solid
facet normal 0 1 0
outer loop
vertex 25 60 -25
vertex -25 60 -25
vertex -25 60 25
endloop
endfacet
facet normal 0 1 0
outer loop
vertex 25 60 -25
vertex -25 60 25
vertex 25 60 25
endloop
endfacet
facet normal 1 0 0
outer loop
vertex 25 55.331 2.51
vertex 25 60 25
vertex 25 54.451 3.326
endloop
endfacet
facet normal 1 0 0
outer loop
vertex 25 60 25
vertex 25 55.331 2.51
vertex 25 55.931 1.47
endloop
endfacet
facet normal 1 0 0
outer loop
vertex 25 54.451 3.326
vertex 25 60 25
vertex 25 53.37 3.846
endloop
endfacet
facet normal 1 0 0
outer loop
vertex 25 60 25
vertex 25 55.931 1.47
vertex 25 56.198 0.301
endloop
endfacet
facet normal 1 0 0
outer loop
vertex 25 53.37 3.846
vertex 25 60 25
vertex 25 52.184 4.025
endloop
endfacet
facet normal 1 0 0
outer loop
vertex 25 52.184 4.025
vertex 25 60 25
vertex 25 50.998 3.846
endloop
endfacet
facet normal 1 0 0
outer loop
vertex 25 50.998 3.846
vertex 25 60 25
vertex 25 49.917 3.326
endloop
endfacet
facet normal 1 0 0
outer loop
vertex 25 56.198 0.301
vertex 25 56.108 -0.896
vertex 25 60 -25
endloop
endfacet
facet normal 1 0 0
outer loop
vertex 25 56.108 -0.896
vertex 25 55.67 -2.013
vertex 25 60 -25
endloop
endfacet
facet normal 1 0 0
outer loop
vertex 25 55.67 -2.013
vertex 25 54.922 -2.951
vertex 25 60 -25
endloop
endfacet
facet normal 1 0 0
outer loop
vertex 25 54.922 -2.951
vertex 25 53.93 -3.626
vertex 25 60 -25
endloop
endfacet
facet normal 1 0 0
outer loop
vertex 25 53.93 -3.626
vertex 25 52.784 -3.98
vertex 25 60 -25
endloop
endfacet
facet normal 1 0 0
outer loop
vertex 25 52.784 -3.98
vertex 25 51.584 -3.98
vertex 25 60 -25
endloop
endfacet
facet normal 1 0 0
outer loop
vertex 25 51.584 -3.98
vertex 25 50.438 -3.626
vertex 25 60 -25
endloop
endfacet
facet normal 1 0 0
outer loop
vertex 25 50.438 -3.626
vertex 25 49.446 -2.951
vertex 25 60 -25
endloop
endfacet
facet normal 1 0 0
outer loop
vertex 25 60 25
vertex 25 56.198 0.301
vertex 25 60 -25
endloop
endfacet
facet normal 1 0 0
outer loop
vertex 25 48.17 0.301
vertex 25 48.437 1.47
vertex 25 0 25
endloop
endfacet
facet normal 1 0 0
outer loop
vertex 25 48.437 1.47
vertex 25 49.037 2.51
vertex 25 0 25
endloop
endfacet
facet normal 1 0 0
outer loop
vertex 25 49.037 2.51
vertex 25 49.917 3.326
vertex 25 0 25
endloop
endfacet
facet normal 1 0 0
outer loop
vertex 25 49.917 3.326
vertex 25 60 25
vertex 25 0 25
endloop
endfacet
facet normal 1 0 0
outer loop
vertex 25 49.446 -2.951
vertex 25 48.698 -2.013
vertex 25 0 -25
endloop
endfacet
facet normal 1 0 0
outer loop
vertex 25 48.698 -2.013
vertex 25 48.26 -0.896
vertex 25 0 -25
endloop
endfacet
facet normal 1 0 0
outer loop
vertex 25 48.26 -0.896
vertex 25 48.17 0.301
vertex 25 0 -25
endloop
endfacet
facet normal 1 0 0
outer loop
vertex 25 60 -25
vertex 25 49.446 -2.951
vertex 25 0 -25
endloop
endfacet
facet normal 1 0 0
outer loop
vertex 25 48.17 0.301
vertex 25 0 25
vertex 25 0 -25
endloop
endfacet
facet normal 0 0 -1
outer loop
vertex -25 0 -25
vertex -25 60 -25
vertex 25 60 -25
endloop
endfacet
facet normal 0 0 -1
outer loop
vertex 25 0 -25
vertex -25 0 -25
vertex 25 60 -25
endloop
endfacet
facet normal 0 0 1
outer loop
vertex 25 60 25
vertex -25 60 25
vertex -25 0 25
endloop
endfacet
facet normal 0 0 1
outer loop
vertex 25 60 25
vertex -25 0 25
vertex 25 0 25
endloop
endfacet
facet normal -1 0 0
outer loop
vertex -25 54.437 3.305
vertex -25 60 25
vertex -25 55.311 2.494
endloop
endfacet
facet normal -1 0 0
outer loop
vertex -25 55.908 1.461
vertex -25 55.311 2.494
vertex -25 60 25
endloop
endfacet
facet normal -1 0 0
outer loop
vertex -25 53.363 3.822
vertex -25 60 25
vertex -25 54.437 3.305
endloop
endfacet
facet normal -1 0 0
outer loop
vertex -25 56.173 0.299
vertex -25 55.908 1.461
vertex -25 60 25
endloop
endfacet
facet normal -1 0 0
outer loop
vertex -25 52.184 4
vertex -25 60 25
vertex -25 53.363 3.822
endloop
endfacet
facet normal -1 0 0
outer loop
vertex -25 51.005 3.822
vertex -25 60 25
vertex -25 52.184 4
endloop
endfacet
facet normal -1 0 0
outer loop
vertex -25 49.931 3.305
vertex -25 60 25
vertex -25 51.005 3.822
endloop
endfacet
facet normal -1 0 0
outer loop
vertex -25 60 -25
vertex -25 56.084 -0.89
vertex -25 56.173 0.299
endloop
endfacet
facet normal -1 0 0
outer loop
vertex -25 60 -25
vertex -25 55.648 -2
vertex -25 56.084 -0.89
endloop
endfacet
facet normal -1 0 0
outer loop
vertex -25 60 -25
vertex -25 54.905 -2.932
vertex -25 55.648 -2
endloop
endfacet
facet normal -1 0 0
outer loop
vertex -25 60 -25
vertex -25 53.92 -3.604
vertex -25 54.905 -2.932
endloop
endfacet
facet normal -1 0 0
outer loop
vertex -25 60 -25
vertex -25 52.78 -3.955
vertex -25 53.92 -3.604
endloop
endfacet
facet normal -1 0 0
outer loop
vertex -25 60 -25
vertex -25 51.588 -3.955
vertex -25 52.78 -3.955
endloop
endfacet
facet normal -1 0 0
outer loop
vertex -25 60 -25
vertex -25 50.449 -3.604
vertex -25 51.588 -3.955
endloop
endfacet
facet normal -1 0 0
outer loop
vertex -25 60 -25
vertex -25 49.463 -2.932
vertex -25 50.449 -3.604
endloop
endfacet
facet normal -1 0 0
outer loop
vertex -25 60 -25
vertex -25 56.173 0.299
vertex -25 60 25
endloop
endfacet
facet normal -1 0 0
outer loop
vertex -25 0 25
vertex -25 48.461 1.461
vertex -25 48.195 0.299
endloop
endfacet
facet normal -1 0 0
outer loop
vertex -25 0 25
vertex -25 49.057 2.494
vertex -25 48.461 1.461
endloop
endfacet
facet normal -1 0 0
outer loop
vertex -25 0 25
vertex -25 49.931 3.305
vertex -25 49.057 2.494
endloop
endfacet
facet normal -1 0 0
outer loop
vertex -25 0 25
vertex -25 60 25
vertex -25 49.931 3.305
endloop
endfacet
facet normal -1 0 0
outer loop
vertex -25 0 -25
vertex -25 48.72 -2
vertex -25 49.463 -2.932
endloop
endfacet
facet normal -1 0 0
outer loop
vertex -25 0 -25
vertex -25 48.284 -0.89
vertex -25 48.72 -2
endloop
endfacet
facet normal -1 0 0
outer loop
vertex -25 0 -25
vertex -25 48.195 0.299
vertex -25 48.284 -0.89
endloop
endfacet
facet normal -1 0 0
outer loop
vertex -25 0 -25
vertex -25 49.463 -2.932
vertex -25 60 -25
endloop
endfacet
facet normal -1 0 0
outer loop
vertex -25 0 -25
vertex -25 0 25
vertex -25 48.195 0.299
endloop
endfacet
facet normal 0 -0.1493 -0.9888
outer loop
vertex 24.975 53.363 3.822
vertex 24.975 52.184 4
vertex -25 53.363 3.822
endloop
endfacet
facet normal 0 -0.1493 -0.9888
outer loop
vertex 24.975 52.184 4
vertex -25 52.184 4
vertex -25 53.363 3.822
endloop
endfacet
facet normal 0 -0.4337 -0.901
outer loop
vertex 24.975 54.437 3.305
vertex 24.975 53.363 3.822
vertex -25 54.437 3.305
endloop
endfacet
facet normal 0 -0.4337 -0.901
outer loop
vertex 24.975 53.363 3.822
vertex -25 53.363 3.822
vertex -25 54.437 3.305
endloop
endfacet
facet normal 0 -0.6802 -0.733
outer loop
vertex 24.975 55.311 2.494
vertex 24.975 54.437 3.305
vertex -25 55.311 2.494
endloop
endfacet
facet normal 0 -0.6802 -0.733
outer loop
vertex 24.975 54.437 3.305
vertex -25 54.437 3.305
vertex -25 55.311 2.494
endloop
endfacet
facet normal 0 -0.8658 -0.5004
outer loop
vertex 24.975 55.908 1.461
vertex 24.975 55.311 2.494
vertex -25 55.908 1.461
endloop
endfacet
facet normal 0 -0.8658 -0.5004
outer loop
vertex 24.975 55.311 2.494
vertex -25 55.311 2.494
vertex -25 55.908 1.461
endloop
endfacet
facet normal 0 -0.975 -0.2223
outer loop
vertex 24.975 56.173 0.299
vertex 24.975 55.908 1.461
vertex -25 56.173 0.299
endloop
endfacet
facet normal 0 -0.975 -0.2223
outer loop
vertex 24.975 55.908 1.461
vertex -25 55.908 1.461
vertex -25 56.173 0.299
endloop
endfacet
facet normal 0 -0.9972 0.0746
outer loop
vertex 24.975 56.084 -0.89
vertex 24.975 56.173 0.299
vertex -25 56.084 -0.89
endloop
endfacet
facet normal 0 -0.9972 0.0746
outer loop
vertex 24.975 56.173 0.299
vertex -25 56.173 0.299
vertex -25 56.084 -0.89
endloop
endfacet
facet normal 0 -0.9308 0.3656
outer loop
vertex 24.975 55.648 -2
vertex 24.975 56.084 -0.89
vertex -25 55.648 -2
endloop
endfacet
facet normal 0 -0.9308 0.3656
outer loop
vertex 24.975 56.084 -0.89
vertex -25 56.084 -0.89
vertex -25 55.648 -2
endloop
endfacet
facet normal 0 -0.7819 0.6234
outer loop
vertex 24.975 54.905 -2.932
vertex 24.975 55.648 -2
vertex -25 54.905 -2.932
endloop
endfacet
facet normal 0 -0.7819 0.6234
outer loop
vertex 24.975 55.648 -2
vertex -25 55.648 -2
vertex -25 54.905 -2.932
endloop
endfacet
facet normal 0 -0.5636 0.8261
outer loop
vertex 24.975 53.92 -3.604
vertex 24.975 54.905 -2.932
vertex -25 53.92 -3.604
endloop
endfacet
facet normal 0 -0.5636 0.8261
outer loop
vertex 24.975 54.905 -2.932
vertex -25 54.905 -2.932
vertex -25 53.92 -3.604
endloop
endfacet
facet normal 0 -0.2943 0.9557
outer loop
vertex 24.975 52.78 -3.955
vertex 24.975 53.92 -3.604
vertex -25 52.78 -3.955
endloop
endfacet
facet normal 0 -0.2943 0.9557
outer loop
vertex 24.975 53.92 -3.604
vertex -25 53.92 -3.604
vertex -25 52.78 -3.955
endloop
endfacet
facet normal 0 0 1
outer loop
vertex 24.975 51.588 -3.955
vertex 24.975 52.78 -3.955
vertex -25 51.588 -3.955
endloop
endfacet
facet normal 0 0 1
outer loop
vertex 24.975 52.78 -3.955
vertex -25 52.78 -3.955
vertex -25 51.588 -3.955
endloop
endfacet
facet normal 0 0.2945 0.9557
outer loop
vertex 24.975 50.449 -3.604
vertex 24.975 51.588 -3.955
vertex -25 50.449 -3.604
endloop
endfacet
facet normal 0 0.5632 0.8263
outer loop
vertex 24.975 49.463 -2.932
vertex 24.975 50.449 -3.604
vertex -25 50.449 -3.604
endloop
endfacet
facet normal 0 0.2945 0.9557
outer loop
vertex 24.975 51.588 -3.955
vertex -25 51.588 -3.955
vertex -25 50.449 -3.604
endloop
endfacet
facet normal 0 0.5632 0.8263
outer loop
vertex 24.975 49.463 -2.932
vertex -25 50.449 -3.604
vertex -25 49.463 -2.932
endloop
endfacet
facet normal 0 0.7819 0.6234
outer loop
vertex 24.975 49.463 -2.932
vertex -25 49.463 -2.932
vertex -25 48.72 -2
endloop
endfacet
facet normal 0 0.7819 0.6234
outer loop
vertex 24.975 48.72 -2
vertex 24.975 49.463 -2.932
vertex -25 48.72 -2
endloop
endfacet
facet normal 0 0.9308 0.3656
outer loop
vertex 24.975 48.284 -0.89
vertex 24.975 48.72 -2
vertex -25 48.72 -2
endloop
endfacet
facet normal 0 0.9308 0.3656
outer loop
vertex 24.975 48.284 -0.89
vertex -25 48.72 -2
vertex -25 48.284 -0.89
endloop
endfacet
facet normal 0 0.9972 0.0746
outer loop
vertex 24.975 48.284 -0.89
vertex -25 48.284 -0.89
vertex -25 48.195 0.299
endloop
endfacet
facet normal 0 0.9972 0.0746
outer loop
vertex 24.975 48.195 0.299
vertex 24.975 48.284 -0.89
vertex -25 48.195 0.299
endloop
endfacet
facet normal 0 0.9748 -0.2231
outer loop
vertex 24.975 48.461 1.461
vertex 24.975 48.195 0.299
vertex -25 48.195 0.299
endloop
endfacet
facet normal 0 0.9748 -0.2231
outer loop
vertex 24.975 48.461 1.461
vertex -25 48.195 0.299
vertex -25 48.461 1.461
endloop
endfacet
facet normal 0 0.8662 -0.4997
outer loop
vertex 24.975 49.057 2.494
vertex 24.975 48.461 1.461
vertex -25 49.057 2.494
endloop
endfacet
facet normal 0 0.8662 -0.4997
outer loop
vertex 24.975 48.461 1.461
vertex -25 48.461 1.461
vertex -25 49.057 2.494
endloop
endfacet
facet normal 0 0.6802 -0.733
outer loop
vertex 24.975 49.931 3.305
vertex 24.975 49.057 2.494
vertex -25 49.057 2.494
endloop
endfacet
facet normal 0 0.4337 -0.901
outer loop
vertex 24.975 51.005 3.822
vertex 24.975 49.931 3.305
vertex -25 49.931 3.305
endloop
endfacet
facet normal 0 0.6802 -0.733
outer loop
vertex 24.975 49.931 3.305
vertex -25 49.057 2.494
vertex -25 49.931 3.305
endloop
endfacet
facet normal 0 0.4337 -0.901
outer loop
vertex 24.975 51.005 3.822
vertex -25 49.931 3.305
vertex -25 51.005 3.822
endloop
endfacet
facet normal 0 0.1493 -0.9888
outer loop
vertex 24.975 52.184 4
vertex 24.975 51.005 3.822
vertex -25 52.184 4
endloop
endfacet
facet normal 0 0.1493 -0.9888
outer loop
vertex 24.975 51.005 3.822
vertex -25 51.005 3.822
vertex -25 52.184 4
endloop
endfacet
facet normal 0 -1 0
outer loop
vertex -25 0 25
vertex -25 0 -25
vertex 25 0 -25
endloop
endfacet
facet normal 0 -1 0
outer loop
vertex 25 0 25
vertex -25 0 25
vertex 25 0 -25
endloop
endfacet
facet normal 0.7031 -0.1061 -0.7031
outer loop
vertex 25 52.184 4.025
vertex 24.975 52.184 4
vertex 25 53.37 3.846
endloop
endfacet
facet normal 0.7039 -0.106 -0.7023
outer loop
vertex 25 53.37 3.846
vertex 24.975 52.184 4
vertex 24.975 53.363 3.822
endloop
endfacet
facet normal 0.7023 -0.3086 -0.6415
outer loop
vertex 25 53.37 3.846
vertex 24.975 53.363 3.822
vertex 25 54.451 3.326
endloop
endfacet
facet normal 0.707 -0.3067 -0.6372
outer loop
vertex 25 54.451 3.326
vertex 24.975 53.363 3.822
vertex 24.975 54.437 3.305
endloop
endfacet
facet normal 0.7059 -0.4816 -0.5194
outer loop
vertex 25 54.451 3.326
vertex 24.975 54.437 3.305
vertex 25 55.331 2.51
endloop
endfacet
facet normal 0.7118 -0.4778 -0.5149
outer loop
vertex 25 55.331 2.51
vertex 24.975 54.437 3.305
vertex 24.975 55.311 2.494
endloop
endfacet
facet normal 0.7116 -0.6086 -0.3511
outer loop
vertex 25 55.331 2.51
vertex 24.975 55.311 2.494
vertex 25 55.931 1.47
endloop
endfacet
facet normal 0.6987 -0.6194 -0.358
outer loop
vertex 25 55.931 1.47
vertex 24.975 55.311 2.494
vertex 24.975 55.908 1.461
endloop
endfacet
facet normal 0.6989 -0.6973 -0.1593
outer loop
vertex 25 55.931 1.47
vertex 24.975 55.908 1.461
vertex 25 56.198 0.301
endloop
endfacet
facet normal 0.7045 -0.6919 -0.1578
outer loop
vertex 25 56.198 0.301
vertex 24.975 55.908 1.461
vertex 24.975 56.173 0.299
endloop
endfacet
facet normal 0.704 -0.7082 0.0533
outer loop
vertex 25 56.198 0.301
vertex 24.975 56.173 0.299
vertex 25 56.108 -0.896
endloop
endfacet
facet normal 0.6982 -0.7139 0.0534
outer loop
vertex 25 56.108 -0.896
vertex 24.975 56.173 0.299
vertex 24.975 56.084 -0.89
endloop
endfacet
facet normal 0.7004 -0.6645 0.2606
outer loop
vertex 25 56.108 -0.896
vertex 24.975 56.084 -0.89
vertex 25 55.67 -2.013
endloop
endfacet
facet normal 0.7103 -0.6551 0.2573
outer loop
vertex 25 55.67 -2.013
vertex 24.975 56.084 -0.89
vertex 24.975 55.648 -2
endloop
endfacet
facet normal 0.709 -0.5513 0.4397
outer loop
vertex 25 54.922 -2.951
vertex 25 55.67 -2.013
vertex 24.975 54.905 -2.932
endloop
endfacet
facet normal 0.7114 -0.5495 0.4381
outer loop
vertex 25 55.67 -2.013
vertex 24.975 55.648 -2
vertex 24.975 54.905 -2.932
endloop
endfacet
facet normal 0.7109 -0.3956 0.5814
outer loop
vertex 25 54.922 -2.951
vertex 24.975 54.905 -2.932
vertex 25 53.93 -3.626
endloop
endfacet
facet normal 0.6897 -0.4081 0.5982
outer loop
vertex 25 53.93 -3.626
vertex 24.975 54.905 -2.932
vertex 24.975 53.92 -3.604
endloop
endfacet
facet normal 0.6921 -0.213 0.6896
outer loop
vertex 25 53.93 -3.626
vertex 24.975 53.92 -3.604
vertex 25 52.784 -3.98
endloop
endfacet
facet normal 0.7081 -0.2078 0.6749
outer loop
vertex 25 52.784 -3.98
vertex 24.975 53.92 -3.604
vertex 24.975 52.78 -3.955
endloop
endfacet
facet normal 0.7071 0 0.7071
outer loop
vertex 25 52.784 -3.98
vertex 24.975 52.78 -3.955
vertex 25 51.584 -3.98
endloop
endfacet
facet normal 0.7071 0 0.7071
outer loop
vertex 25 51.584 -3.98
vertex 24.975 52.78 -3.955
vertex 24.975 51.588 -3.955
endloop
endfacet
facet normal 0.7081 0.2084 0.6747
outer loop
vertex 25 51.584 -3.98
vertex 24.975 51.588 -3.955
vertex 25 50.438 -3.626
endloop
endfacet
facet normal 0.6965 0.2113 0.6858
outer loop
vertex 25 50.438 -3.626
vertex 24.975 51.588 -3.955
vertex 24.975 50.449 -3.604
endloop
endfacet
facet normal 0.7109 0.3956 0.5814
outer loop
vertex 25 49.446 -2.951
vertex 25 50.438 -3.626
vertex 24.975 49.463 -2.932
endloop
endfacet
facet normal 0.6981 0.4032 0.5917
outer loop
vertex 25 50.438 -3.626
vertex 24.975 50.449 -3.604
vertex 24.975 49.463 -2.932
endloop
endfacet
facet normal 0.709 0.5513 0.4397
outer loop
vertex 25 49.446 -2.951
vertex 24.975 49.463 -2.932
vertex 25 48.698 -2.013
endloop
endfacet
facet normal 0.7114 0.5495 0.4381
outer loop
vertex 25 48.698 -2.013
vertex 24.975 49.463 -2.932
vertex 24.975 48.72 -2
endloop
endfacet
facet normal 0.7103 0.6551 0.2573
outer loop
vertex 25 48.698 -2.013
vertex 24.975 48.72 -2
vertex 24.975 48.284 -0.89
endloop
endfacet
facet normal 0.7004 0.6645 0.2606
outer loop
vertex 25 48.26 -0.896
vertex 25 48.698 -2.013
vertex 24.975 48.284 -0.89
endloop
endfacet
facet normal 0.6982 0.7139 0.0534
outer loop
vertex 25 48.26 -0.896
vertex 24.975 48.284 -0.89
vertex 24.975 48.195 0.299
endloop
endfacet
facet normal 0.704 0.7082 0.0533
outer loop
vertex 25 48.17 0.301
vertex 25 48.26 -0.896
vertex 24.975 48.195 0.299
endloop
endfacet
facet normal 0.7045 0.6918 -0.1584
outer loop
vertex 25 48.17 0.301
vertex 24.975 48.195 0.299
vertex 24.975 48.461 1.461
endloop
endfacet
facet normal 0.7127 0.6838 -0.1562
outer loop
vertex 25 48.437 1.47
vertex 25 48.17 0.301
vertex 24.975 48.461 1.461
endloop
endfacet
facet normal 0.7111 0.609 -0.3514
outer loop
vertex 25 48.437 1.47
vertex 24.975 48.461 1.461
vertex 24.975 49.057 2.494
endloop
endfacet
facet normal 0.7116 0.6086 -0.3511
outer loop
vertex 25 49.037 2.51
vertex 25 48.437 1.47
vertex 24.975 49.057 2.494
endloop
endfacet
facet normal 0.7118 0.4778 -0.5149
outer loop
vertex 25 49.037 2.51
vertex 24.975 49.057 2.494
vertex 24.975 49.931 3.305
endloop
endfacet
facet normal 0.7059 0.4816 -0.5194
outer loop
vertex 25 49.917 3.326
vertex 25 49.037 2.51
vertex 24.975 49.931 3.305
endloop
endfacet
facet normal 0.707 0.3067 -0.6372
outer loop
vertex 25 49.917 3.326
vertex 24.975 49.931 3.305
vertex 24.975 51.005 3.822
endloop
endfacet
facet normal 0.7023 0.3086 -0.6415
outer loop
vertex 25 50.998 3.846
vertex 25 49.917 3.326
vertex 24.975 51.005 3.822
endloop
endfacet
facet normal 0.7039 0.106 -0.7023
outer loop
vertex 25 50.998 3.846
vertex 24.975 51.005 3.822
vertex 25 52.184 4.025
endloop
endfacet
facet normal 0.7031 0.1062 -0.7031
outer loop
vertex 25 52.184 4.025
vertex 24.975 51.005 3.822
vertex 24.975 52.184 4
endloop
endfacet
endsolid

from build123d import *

# Parameters (mm, degrees)
SKETCH1_W                       = 50
SKETCH1_H                       = 50
BOSS_EXTRUDE1_DEPTH             = 60
F_8_0MM_DOWEL_HOLE1_D           = 8
F_8_0MM_DOWEL_HOLE1_CSINK_D     = 8.05
F_8_0MM_DOWEL_HOLE1_CSINK_ANGLE = 90


with BuildPart() as part:
    # Sketch1 → Boss-Extrude1 (new body)
    with BuildSketch(Plane(origin=(0, 0, 0), x_dir=(1, 0, 0), z_dir=(0, 1, 0))):
        Rectangle(SKETCH1_W, SKETCH1_H)
    extrude(amount=BOSS_EXTRUDE1_DEPTH)

    # Ø8.0mm Dowel Hole1 (through all)
    with Locations(Plane(origin=(25, 0, 0), x_dir=(0, 0, -1), z_dir=(1, 0, 0))):
        with Locations((0, 52.184072135)):
            CounterSinkHole(F_8_0MM_DOWEL_HOLE1_D / 2, F_8_0MM_DOWEL_HOLE1_CSINK_D / 2, counter_sink_angle=F_8_0MM_DOWEL_HOLE1_CSINK_ANGLE)


solid = part.part
